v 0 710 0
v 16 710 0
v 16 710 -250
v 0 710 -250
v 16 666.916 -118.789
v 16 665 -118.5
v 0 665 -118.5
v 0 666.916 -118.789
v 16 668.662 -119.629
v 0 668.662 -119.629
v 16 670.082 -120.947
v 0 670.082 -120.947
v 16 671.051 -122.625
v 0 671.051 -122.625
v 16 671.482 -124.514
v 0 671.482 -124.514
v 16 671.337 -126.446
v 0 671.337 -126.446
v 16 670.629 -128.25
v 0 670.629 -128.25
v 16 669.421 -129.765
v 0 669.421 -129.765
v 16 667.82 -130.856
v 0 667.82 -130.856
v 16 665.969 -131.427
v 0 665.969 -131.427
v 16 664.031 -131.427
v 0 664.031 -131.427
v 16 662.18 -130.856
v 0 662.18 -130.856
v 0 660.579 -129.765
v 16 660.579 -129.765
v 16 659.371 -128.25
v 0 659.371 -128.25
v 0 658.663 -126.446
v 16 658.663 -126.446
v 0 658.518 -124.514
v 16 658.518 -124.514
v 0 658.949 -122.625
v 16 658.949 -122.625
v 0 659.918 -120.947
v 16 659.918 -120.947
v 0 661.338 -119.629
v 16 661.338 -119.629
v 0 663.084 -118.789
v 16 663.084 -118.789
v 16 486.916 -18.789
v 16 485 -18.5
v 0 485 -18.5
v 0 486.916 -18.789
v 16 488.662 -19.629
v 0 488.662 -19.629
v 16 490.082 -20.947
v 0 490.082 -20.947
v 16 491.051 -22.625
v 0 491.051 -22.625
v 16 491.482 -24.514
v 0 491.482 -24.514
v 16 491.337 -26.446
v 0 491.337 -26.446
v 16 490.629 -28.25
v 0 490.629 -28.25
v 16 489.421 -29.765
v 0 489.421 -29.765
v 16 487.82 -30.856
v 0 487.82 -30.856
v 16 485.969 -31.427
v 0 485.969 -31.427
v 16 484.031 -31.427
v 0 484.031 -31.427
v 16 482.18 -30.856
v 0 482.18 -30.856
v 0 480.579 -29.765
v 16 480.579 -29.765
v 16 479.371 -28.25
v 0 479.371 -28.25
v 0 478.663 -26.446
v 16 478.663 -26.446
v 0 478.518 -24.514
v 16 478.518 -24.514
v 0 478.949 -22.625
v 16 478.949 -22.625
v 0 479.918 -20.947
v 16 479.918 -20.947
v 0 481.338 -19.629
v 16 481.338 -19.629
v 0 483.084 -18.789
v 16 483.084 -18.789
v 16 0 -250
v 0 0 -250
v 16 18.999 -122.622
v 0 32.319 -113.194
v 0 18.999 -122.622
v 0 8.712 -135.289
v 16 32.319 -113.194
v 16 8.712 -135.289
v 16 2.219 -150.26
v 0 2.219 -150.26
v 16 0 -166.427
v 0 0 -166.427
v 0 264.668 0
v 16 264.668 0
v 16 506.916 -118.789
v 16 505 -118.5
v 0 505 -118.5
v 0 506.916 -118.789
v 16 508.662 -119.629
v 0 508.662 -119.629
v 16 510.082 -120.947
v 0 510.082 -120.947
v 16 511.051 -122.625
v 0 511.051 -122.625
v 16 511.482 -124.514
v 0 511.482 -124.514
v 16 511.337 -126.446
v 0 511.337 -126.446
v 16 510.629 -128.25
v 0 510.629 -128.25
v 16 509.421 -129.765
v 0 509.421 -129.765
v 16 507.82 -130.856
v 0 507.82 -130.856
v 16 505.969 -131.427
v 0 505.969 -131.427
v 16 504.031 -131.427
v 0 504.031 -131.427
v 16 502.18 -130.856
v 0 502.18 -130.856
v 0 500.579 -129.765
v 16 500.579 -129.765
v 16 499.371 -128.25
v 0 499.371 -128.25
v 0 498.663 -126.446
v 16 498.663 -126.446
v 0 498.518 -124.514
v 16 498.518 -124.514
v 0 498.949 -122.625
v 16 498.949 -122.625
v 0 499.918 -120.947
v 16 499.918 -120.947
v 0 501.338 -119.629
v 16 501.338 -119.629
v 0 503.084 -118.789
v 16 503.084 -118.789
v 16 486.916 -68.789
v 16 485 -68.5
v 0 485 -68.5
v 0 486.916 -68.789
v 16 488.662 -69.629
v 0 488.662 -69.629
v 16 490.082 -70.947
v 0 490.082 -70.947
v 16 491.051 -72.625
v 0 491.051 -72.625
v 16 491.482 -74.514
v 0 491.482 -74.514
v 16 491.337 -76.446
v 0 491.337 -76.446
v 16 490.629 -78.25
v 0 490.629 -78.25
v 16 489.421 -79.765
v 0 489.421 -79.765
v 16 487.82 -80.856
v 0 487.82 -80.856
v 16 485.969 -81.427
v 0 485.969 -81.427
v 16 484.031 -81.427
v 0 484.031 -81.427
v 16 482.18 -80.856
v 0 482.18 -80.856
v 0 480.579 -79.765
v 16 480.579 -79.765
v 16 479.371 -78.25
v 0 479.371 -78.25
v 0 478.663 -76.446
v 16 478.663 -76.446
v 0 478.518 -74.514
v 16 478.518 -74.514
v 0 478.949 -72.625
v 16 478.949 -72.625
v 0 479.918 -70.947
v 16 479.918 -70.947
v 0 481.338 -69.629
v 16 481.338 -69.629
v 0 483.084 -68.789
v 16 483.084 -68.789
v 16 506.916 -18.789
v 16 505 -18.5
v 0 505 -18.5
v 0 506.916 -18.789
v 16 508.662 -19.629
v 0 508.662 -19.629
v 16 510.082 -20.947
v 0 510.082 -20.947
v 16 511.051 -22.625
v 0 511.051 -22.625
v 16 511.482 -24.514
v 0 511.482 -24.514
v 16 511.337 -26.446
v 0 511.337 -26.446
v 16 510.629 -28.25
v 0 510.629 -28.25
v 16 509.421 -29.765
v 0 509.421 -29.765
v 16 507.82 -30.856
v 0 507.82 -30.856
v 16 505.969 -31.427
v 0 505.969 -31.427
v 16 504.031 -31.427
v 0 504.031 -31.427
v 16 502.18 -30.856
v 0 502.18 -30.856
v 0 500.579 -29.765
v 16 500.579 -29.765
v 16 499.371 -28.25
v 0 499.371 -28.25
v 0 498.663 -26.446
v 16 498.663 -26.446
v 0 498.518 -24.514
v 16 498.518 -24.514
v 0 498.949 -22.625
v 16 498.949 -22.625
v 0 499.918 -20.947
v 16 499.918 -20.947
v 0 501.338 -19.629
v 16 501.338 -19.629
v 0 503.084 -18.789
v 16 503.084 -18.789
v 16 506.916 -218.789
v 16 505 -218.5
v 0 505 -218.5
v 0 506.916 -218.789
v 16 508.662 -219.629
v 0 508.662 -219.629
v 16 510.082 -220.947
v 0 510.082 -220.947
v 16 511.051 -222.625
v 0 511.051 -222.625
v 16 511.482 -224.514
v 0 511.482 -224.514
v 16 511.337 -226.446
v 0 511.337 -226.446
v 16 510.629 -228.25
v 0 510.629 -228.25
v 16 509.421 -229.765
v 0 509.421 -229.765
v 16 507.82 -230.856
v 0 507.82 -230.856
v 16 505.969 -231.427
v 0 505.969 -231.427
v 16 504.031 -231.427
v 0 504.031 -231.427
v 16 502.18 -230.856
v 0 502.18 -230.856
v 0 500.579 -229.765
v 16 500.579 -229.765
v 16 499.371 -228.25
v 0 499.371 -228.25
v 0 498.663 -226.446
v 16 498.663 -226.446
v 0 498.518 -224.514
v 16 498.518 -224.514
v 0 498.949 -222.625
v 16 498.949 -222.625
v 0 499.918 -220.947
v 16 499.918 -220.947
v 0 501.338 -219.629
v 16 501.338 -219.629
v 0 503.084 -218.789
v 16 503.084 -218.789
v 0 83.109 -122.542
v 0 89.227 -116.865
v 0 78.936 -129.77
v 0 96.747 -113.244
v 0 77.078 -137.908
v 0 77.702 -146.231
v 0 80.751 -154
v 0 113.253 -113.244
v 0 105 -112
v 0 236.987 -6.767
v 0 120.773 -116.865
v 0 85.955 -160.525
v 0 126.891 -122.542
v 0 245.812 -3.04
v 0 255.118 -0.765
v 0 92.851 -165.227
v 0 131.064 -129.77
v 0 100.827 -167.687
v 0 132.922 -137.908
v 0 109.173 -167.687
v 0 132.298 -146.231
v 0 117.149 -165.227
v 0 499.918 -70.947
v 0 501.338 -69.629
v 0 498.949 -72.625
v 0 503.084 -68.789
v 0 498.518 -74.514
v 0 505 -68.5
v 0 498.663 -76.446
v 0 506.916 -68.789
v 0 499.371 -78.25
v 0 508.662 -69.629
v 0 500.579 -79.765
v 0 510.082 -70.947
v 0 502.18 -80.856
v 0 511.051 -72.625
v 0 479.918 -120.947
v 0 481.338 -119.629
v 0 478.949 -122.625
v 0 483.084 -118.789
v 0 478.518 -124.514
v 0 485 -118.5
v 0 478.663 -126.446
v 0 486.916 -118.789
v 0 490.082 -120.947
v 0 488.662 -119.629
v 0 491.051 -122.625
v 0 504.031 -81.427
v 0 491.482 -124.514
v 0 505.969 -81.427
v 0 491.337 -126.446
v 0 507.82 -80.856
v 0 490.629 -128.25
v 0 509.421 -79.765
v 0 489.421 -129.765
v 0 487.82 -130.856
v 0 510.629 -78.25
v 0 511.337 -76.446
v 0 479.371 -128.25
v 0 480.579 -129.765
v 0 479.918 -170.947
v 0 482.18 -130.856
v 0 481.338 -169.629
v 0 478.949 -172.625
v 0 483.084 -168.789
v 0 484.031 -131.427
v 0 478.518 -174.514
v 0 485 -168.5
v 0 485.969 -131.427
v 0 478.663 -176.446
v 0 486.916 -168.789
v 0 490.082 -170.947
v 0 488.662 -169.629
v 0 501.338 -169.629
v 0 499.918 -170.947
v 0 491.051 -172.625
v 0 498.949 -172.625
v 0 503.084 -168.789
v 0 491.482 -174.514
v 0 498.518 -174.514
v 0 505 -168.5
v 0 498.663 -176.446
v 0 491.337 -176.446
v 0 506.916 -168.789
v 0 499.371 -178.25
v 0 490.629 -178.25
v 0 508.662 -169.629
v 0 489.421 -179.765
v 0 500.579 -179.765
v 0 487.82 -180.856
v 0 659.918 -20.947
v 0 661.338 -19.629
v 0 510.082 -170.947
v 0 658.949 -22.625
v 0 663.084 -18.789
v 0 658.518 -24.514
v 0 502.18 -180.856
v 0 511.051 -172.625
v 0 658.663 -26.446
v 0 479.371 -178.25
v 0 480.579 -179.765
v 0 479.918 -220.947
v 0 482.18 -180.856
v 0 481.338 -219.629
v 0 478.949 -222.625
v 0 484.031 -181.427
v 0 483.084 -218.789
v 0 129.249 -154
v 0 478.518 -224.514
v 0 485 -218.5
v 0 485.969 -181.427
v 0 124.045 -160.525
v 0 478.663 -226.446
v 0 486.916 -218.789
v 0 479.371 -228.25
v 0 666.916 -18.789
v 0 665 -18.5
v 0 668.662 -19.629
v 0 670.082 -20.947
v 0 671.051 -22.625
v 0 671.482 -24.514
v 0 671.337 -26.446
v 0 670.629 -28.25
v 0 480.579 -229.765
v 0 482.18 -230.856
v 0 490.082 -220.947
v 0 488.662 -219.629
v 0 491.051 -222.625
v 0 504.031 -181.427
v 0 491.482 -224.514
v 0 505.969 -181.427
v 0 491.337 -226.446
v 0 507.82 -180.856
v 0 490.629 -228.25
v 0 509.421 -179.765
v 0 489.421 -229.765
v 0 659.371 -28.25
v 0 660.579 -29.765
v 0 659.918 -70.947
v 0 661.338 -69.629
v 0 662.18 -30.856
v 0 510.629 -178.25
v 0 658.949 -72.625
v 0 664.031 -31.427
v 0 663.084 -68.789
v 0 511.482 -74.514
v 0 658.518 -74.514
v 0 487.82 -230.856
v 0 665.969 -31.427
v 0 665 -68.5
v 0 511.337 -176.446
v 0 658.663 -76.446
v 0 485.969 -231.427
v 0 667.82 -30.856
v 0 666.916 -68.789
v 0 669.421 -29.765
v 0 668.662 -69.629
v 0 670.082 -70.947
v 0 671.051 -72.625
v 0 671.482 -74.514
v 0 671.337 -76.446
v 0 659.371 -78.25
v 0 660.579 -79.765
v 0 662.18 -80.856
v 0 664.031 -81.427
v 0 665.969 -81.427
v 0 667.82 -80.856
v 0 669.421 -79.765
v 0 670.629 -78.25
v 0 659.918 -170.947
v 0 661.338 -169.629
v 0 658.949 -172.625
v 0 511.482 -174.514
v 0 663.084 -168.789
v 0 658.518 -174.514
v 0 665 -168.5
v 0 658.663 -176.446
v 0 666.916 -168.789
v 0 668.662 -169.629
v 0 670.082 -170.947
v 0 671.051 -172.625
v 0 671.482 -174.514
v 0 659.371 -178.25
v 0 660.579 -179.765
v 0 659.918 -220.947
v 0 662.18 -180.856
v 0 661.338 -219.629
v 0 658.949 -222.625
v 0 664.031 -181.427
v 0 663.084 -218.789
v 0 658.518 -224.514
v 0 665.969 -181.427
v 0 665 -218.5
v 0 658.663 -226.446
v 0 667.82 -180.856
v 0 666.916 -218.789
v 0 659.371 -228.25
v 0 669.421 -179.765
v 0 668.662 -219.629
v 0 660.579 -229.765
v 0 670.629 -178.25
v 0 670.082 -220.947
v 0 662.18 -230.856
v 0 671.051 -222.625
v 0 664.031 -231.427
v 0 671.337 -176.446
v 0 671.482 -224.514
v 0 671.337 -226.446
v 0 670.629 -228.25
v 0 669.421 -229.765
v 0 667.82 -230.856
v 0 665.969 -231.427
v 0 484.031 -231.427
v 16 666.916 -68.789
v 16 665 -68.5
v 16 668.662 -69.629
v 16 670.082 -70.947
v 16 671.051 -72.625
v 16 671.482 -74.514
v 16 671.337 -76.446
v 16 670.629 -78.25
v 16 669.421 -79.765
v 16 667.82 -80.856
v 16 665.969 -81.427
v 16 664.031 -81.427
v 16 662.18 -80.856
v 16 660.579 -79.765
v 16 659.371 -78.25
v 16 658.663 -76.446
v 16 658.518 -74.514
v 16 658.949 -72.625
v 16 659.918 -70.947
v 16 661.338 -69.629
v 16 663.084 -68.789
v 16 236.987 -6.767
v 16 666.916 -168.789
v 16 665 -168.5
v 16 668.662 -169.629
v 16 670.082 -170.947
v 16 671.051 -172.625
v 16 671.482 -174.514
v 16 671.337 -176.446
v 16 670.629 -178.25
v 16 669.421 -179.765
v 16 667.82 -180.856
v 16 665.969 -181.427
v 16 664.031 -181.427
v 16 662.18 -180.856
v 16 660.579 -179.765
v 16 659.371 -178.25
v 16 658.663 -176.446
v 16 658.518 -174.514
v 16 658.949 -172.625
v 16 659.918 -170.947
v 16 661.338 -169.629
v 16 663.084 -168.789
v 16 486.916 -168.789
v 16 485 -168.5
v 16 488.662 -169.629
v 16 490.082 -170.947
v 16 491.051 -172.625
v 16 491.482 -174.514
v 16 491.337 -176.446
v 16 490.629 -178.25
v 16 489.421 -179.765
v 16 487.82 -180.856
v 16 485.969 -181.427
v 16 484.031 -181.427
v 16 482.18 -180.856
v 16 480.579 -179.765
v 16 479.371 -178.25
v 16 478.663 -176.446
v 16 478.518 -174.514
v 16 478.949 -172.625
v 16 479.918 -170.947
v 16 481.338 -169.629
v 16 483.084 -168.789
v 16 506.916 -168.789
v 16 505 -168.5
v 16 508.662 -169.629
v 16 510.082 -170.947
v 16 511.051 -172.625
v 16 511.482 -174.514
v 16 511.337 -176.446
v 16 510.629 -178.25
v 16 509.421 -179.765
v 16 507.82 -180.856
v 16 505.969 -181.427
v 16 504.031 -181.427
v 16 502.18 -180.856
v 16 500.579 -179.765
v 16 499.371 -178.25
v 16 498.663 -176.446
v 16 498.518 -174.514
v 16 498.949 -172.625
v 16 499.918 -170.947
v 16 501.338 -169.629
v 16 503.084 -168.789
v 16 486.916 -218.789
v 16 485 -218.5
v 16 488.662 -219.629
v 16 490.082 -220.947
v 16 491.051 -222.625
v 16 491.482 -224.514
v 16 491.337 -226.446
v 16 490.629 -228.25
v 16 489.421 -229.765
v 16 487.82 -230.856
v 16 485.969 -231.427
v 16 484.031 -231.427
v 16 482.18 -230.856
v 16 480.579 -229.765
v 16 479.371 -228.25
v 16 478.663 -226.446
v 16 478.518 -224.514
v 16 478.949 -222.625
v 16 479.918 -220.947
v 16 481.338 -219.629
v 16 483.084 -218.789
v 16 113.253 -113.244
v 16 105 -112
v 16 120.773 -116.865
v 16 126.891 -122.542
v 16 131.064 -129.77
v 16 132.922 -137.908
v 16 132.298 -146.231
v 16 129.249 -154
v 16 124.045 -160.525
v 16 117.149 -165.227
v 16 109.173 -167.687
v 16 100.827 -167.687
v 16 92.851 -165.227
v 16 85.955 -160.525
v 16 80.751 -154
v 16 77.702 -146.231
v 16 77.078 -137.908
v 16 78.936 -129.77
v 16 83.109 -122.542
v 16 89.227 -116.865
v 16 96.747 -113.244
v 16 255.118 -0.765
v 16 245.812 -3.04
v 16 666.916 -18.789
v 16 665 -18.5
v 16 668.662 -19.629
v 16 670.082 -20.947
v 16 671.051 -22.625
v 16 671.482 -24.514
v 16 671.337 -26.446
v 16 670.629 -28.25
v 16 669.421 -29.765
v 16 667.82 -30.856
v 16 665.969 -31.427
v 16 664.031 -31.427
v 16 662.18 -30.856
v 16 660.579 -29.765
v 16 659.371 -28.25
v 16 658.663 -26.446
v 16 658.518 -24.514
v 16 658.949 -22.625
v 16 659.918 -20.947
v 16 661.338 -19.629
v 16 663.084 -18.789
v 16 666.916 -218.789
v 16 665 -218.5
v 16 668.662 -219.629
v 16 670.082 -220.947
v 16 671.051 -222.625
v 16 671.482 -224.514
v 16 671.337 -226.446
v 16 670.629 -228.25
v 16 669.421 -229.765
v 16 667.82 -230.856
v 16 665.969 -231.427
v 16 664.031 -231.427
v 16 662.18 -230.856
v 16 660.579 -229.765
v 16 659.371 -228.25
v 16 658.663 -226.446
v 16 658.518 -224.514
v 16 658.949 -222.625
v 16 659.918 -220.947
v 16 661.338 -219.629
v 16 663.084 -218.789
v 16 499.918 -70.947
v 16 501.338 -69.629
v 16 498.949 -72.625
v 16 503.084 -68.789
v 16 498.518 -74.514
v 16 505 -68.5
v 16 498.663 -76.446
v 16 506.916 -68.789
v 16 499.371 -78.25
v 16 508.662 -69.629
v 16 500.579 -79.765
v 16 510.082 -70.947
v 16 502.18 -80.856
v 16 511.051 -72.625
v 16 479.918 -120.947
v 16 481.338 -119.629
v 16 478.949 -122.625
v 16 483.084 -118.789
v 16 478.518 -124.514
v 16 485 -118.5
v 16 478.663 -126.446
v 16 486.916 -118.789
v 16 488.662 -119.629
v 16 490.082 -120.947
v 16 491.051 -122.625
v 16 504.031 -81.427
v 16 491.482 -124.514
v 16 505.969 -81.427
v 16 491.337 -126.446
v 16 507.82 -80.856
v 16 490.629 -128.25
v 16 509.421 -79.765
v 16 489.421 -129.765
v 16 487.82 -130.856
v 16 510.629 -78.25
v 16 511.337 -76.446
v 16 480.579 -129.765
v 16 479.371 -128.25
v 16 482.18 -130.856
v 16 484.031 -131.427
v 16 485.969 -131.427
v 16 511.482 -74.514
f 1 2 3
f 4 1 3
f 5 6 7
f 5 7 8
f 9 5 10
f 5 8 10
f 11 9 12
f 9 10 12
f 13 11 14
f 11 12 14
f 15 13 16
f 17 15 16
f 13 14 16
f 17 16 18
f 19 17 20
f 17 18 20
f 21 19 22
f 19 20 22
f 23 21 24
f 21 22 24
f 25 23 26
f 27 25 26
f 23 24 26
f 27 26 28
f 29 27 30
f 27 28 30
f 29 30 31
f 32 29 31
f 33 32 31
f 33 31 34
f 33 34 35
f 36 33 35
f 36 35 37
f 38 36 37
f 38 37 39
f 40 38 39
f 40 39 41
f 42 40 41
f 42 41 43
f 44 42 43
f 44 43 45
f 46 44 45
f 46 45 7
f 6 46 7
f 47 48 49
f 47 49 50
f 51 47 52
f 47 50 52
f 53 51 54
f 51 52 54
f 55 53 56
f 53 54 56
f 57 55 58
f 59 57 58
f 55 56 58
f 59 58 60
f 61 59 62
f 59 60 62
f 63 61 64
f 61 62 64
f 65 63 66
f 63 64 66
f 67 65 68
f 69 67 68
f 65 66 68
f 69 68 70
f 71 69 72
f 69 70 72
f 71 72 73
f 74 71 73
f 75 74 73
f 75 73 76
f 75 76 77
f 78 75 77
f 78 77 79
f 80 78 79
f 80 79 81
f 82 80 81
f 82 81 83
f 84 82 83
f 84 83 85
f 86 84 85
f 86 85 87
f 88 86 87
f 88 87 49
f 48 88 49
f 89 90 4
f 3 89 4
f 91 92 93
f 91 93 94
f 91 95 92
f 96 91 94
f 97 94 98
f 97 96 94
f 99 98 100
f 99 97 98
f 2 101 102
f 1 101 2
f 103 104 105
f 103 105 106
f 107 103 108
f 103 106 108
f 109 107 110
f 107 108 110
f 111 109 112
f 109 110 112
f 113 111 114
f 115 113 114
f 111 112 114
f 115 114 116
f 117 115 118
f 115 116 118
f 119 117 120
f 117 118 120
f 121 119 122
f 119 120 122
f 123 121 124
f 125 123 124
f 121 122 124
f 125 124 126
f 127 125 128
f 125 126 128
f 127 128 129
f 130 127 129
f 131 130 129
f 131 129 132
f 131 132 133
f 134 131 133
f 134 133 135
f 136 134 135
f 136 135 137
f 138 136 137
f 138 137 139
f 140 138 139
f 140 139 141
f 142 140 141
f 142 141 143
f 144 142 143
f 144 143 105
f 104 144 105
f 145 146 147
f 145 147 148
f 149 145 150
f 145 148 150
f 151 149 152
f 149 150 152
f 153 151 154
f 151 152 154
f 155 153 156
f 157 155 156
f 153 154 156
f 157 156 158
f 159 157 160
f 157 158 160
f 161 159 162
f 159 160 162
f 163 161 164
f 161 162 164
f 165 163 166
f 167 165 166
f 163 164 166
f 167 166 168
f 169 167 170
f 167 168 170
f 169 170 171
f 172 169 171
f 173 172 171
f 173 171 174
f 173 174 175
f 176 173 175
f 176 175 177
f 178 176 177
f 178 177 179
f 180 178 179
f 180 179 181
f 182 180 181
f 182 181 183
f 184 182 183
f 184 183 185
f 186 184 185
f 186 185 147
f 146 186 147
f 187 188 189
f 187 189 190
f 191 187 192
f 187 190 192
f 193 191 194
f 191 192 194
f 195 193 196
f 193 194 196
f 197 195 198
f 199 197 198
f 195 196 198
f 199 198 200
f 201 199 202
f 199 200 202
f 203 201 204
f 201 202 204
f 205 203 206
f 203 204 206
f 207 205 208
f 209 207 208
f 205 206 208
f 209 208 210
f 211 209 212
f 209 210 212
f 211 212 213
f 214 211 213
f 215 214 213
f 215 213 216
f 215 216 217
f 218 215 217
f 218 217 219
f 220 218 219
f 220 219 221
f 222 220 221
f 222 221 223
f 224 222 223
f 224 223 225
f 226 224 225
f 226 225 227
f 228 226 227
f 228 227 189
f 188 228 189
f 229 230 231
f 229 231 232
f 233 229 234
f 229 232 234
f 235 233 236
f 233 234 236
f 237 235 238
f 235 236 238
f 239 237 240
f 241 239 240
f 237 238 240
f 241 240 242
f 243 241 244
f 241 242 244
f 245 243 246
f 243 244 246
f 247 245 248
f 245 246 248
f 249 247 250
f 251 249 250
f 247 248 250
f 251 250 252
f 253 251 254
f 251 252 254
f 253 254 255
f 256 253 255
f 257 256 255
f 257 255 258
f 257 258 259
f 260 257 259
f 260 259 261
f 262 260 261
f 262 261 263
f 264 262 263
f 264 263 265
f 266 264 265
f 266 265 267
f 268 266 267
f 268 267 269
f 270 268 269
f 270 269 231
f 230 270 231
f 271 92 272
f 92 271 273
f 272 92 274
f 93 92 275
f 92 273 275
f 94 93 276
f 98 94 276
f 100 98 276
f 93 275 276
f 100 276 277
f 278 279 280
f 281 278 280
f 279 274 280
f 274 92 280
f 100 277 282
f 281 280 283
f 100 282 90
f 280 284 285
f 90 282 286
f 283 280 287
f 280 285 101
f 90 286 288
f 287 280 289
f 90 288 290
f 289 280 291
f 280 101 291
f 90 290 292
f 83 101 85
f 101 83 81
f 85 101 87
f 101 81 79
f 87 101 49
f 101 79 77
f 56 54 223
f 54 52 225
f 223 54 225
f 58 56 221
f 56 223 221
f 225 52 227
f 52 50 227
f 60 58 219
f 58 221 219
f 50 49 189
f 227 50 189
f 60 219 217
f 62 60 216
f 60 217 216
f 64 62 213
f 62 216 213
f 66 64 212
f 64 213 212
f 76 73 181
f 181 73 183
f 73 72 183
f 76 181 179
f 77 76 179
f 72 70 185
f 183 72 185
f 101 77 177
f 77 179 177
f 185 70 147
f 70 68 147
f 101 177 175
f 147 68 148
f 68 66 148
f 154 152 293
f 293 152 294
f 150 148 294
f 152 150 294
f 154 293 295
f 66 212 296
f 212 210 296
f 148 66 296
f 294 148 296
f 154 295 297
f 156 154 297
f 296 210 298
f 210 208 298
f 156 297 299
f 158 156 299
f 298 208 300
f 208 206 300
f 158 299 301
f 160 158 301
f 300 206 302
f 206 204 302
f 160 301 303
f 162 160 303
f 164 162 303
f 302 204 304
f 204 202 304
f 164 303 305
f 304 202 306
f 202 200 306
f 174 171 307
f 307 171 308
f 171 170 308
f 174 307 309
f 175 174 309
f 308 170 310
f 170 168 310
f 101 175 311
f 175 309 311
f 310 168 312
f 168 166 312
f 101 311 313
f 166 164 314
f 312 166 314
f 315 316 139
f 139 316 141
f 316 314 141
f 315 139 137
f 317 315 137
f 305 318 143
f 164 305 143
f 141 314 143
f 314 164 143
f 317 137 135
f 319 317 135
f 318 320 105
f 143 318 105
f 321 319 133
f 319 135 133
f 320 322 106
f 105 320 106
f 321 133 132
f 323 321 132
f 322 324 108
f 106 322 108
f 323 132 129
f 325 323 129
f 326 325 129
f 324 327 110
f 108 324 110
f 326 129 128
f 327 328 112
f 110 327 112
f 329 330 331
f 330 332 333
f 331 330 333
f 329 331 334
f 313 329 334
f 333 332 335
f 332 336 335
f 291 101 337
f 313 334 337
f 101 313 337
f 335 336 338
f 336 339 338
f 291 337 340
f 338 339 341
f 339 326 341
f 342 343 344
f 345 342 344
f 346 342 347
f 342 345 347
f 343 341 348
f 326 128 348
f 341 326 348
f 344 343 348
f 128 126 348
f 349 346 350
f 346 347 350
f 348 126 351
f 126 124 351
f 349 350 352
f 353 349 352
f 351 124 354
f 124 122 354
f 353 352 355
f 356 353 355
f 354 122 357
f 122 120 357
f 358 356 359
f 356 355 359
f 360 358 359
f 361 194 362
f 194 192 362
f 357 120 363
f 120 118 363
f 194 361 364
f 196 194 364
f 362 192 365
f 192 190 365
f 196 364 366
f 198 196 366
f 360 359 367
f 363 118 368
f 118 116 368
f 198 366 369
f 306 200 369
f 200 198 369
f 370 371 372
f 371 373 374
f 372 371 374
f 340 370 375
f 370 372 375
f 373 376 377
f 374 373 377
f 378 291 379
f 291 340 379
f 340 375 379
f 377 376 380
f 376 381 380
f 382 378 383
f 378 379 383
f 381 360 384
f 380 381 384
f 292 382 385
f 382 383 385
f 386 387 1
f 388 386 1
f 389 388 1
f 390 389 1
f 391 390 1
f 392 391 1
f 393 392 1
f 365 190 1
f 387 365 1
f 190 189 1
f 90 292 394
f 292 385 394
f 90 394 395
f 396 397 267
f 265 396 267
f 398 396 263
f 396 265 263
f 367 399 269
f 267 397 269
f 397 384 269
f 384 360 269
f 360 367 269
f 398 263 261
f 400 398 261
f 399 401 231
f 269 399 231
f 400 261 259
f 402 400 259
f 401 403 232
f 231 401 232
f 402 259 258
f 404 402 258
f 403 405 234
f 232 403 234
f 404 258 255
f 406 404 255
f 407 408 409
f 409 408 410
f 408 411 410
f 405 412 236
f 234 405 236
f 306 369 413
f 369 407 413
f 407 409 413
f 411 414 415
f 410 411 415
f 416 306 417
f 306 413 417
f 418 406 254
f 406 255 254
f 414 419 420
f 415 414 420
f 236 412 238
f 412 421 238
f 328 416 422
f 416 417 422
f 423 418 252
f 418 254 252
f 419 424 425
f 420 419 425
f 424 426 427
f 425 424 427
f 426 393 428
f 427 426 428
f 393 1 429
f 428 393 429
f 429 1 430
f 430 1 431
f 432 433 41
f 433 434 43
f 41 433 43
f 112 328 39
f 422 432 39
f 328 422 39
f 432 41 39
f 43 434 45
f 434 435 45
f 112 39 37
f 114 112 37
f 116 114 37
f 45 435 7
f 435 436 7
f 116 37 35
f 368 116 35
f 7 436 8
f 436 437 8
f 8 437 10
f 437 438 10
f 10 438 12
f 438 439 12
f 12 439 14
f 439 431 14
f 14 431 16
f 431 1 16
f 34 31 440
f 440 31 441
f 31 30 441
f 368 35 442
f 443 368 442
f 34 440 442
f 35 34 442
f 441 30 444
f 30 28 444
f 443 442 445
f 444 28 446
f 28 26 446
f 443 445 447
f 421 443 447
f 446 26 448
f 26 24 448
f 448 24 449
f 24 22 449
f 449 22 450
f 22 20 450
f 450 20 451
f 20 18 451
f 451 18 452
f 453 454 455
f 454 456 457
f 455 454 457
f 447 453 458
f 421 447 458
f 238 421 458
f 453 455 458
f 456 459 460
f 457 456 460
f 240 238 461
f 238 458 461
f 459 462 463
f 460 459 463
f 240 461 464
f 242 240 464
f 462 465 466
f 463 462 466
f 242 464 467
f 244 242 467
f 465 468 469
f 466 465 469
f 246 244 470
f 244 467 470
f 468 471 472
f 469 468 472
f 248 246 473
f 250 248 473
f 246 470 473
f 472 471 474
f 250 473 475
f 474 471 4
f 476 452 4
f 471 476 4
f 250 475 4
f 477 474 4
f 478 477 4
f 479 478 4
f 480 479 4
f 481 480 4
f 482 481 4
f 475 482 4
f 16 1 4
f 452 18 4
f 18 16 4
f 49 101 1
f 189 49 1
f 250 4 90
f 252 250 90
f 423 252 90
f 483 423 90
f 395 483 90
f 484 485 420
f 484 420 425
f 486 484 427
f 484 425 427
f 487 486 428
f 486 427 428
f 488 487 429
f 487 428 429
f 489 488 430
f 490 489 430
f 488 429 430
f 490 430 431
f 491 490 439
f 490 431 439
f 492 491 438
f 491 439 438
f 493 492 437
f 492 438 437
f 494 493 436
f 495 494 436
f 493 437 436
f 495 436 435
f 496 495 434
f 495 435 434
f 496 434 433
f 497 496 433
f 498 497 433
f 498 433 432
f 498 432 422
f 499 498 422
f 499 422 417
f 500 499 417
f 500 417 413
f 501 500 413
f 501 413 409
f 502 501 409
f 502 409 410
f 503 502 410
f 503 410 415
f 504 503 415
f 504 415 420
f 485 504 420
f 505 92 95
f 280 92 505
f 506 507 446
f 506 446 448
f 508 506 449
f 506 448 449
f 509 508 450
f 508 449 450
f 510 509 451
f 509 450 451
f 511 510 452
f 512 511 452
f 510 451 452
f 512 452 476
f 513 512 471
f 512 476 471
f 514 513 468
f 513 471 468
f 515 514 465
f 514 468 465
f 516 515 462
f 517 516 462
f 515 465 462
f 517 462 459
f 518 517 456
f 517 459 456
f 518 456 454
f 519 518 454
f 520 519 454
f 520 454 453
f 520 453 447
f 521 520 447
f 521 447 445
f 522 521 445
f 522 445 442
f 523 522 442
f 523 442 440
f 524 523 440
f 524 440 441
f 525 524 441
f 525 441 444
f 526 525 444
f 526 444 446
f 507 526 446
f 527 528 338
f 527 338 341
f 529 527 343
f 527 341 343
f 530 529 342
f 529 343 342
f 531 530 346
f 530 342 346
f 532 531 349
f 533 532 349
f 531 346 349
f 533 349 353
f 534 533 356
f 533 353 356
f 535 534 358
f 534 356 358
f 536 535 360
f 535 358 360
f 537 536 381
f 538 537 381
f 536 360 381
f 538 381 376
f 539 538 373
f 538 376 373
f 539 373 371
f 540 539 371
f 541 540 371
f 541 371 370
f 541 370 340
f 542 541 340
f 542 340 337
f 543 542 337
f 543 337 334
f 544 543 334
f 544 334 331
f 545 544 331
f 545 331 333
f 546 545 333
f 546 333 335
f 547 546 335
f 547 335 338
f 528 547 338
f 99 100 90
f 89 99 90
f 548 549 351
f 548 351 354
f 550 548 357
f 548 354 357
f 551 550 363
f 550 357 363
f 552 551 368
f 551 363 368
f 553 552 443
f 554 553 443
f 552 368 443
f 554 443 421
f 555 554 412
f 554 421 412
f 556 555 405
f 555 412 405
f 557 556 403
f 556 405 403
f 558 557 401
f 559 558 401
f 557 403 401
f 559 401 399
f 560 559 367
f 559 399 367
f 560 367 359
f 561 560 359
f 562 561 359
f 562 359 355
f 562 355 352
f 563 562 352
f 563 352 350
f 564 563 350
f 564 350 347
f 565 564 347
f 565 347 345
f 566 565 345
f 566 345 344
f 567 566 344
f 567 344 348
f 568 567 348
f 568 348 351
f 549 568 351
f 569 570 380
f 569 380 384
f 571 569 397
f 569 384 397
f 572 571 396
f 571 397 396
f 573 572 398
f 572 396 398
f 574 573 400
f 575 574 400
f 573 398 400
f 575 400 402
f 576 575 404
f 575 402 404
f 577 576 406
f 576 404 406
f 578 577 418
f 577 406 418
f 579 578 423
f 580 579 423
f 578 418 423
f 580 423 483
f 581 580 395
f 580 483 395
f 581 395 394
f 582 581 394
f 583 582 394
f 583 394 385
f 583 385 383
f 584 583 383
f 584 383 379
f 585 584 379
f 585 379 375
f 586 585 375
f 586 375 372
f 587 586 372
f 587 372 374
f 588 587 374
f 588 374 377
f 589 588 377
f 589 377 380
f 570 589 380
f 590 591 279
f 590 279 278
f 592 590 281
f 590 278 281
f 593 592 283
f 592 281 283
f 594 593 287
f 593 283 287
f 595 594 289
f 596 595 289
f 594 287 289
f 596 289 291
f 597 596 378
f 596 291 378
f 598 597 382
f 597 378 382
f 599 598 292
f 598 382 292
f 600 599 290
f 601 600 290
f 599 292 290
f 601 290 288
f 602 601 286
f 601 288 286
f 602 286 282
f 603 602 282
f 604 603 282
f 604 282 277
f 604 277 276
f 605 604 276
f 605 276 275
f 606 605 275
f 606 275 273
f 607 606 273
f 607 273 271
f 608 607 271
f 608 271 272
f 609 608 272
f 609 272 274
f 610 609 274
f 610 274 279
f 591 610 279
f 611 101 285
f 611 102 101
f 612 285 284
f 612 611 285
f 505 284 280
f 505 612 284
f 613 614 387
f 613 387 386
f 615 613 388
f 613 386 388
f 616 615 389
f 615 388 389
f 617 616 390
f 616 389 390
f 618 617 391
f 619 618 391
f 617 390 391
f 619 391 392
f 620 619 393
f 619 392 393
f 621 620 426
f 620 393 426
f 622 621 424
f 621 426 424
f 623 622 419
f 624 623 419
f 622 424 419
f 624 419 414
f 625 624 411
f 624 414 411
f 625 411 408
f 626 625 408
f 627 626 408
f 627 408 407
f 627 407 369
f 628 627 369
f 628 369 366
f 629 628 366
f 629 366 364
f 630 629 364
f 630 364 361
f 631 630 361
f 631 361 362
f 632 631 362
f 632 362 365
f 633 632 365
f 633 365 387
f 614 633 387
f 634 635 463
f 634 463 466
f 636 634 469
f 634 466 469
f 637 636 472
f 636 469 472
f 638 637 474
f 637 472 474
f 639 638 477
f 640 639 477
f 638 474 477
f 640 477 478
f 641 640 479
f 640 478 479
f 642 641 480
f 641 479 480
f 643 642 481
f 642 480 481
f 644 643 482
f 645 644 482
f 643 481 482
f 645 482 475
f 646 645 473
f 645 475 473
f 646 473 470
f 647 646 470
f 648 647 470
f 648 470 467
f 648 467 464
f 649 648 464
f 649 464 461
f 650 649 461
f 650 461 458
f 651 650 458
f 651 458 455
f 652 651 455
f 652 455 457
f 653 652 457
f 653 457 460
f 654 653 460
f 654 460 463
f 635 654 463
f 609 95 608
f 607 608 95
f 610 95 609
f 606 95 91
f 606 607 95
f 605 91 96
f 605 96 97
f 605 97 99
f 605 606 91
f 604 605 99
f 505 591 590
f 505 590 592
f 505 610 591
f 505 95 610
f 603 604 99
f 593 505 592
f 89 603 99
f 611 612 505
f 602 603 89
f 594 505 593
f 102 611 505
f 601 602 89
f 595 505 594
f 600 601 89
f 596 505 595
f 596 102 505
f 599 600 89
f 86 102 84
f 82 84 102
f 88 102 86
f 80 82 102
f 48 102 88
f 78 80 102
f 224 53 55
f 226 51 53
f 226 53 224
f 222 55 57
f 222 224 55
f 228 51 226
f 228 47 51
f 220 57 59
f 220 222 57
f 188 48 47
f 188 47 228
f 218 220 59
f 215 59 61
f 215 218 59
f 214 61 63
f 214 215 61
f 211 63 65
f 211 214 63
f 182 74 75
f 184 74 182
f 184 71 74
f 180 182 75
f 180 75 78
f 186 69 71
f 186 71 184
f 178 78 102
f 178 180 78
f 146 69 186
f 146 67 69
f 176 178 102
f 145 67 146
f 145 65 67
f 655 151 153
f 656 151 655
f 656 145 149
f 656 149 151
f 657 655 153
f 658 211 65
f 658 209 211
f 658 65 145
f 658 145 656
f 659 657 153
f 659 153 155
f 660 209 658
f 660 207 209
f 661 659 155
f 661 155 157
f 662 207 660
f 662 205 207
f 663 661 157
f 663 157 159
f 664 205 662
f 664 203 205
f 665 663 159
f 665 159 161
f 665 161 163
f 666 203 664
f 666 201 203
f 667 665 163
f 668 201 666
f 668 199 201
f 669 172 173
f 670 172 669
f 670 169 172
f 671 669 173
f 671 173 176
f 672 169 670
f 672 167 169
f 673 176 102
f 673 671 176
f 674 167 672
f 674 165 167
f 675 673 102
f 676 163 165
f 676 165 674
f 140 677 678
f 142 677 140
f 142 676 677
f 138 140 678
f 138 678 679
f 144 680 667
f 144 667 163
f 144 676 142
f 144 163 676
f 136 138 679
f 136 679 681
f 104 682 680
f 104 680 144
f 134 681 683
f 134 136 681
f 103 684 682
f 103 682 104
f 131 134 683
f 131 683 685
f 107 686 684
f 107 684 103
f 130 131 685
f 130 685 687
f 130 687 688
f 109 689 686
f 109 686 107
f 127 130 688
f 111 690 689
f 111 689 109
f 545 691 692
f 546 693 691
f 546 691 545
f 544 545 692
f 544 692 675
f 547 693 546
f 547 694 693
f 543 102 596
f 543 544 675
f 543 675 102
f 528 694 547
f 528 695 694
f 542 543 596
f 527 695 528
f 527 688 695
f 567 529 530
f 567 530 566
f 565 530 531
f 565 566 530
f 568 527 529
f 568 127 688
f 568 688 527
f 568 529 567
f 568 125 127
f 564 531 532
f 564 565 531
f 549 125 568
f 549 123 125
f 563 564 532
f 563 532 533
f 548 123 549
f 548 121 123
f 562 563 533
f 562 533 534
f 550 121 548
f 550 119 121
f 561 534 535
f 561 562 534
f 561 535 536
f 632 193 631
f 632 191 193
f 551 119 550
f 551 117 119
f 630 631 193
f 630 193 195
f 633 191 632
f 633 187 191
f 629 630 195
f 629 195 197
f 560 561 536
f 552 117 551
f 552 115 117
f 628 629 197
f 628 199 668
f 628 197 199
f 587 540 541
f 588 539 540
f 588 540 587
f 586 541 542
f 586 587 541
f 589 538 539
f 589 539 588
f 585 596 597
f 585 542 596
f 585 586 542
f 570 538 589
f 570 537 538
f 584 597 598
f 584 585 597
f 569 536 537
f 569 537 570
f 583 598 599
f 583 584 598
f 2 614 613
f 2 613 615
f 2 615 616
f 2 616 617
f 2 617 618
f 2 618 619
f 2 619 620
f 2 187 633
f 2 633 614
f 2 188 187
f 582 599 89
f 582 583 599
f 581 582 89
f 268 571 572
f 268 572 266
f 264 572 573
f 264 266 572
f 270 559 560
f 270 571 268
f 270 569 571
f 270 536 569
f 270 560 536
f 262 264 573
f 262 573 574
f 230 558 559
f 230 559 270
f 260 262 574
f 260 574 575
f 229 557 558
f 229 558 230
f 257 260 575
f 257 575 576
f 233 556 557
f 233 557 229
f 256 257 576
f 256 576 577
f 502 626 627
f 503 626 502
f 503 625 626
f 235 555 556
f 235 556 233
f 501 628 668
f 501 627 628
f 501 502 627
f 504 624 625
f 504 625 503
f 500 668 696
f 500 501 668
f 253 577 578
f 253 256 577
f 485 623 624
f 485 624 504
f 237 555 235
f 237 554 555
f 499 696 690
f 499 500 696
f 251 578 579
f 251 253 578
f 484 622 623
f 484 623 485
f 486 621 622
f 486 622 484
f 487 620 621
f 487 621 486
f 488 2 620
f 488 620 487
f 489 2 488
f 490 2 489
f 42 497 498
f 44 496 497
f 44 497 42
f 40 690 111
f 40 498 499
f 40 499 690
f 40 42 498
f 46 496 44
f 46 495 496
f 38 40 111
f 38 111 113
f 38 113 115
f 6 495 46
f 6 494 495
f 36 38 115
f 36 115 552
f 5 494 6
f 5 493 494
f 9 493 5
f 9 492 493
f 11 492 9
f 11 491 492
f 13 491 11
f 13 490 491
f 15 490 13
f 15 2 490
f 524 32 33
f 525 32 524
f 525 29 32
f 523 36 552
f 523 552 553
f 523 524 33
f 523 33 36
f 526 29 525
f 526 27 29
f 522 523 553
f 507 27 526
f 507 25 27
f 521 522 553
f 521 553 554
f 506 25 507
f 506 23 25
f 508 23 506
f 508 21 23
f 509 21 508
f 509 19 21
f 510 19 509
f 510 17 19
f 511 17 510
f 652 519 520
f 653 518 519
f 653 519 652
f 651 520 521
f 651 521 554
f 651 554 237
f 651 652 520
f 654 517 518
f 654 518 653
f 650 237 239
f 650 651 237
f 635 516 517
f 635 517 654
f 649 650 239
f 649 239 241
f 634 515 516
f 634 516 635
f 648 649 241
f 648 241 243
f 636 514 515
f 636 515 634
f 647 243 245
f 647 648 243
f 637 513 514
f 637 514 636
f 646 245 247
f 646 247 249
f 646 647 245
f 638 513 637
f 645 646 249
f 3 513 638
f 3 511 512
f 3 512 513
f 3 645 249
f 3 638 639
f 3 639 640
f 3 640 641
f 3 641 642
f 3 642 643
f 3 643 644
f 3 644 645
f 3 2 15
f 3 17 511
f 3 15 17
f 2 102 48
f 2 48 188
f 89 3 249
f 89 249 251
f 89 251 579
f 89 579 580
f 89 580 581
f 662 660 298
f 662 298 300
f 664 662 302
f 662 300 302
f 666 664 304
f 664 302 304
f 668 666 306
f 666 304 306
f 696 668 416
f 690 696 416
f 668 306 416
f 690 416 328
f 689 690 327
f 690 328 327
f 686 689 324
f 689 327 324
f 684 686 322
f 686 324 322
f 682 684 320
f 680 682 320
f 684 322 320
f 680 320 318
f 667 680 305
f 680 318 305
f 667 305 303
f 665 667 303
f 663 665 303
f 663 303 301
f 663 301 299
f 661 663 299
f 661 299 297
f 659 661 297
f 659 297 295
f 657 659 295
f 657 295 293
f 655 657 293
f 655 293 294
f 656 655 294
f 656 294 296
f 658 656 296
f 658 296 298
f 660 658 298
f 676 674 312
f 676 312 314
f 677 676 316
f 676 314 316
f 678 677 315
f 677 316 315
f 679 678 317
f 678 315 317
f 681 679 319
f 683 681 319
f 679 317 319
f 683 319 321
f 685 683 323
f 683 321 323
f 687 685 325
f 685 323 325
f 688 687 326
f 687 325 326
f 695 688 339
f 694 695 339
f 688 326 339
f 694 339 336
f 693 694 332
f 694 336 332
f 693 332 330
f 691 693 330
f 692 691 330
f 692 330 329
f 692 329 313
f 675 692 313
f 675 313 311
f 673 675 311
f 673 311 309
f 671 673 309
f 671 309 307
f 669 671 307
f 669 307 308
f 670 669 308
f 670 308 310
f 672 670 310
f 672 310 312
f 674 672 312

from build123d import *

# Parameters (mm, degrees)
SKETCH_1_W             = 250
SKETCH_1_H             = 750
EXTRUDE_1_DEPTH        = 16
CUT_EXTRUDE_2_DEPTH    = 20
SKETCH_5_R             = 6.5
CUT_EXTRUDE_3_DEPTH    = 791.731307082
PATTERN_LINEAR_1_COUNT = 5
PATTERN_LINEAR_1_PITCH = 50
SKETCH_6_R             = 28
CUT_EXTRUDE_4_DEPTH    = 791.731307082
FILLET_1_R             = 60
SKETCH_7_W             = 250
SKETCH_7_H             = 40
CUT_EXTRUDE_5_DEPTH    = 66


with BuildPart() as part:
    # 草图1 → 凸台-拉伸1 (new body)
    with BuildSketch(Plane(origin=(0, 0, 0), x_dir=(0, 0, -1), z_dir=(1, 0, 0))):
        with Locations((125, 375)):
            Rectangle(SKETCH_1_W, SKETCH_1_H)
    extrude(amount=EXTRUDE_1_DEPTH)

    # 草图3 → 切除-拉伸2 (cut)
    with BuildSketch(Plane.ZY):
        Polygon((-130, 0), (0, 250), (0, 0), align=None)
    extrude(amount=-CUT_EXTRUDE_2_DEPTH, mode=Mode.SUBTRACT)

    # 草图5 → 切除-拉伸3 (cut, through all)
    with BuildSketch(Plane.ZY):
        with Locations((-225, 665)):
            Circle(SKETCH_5_R)
        with Locations((-225, 505)):
            Circle(SKETCH_5_R)
        with Locations((-225, 485)):
            Circle(SKETCH_5_R)
    cut_extrude_3 = extrude(amount=-CUT_EXTRUDE_3_DEPTH, mode=Mode.SUBTRACT)

    # 阵列(线性)1: 切除-拉伸3 ×5
    with Locations(*[(0, 0, i * PATTERN_LINEAR_1_PITCH) for i in range(1, PATTERN_LINEAR_1_COUNT)]):
        add(cut_extrude_3, mode=Mode.SUBTRACT)

    # 草图6 → 切除-拉伸4 (cut, through all)
    with BuildSketch(Plane.ZY):
        with Locations((-140, 105)):
            Circle(SKETCH_6_R)
    extrude(amount=-CUT_EXTRUDE_4_DEPTH, mode=Mode.SUBTRACT)

    # 圆角1
    fillet_1_edges = [part.edges().sort_by_distance(p)[0] for p in [
        (8, 0, -130),
        (8, 250, 0),
    ]]
    fillet(fillet_1_edges, radius=FILLET_1_R)

    # 草图7 → 切除-拉伸5 (cut)
    with BuildSketch(Plane(origin=(16, 0, 0), x_dir=(0, 0, -1), z_dir=(1, 0, 0))):
        with Locations((125, 730)):
            Rectangle(SKETCH_7_W, SKETCH_7_H)
    extrude(amount=-CUT_EXTRUDE_5_DEPTH, mode=Mode.SUBTRACT)


solid = part.part
